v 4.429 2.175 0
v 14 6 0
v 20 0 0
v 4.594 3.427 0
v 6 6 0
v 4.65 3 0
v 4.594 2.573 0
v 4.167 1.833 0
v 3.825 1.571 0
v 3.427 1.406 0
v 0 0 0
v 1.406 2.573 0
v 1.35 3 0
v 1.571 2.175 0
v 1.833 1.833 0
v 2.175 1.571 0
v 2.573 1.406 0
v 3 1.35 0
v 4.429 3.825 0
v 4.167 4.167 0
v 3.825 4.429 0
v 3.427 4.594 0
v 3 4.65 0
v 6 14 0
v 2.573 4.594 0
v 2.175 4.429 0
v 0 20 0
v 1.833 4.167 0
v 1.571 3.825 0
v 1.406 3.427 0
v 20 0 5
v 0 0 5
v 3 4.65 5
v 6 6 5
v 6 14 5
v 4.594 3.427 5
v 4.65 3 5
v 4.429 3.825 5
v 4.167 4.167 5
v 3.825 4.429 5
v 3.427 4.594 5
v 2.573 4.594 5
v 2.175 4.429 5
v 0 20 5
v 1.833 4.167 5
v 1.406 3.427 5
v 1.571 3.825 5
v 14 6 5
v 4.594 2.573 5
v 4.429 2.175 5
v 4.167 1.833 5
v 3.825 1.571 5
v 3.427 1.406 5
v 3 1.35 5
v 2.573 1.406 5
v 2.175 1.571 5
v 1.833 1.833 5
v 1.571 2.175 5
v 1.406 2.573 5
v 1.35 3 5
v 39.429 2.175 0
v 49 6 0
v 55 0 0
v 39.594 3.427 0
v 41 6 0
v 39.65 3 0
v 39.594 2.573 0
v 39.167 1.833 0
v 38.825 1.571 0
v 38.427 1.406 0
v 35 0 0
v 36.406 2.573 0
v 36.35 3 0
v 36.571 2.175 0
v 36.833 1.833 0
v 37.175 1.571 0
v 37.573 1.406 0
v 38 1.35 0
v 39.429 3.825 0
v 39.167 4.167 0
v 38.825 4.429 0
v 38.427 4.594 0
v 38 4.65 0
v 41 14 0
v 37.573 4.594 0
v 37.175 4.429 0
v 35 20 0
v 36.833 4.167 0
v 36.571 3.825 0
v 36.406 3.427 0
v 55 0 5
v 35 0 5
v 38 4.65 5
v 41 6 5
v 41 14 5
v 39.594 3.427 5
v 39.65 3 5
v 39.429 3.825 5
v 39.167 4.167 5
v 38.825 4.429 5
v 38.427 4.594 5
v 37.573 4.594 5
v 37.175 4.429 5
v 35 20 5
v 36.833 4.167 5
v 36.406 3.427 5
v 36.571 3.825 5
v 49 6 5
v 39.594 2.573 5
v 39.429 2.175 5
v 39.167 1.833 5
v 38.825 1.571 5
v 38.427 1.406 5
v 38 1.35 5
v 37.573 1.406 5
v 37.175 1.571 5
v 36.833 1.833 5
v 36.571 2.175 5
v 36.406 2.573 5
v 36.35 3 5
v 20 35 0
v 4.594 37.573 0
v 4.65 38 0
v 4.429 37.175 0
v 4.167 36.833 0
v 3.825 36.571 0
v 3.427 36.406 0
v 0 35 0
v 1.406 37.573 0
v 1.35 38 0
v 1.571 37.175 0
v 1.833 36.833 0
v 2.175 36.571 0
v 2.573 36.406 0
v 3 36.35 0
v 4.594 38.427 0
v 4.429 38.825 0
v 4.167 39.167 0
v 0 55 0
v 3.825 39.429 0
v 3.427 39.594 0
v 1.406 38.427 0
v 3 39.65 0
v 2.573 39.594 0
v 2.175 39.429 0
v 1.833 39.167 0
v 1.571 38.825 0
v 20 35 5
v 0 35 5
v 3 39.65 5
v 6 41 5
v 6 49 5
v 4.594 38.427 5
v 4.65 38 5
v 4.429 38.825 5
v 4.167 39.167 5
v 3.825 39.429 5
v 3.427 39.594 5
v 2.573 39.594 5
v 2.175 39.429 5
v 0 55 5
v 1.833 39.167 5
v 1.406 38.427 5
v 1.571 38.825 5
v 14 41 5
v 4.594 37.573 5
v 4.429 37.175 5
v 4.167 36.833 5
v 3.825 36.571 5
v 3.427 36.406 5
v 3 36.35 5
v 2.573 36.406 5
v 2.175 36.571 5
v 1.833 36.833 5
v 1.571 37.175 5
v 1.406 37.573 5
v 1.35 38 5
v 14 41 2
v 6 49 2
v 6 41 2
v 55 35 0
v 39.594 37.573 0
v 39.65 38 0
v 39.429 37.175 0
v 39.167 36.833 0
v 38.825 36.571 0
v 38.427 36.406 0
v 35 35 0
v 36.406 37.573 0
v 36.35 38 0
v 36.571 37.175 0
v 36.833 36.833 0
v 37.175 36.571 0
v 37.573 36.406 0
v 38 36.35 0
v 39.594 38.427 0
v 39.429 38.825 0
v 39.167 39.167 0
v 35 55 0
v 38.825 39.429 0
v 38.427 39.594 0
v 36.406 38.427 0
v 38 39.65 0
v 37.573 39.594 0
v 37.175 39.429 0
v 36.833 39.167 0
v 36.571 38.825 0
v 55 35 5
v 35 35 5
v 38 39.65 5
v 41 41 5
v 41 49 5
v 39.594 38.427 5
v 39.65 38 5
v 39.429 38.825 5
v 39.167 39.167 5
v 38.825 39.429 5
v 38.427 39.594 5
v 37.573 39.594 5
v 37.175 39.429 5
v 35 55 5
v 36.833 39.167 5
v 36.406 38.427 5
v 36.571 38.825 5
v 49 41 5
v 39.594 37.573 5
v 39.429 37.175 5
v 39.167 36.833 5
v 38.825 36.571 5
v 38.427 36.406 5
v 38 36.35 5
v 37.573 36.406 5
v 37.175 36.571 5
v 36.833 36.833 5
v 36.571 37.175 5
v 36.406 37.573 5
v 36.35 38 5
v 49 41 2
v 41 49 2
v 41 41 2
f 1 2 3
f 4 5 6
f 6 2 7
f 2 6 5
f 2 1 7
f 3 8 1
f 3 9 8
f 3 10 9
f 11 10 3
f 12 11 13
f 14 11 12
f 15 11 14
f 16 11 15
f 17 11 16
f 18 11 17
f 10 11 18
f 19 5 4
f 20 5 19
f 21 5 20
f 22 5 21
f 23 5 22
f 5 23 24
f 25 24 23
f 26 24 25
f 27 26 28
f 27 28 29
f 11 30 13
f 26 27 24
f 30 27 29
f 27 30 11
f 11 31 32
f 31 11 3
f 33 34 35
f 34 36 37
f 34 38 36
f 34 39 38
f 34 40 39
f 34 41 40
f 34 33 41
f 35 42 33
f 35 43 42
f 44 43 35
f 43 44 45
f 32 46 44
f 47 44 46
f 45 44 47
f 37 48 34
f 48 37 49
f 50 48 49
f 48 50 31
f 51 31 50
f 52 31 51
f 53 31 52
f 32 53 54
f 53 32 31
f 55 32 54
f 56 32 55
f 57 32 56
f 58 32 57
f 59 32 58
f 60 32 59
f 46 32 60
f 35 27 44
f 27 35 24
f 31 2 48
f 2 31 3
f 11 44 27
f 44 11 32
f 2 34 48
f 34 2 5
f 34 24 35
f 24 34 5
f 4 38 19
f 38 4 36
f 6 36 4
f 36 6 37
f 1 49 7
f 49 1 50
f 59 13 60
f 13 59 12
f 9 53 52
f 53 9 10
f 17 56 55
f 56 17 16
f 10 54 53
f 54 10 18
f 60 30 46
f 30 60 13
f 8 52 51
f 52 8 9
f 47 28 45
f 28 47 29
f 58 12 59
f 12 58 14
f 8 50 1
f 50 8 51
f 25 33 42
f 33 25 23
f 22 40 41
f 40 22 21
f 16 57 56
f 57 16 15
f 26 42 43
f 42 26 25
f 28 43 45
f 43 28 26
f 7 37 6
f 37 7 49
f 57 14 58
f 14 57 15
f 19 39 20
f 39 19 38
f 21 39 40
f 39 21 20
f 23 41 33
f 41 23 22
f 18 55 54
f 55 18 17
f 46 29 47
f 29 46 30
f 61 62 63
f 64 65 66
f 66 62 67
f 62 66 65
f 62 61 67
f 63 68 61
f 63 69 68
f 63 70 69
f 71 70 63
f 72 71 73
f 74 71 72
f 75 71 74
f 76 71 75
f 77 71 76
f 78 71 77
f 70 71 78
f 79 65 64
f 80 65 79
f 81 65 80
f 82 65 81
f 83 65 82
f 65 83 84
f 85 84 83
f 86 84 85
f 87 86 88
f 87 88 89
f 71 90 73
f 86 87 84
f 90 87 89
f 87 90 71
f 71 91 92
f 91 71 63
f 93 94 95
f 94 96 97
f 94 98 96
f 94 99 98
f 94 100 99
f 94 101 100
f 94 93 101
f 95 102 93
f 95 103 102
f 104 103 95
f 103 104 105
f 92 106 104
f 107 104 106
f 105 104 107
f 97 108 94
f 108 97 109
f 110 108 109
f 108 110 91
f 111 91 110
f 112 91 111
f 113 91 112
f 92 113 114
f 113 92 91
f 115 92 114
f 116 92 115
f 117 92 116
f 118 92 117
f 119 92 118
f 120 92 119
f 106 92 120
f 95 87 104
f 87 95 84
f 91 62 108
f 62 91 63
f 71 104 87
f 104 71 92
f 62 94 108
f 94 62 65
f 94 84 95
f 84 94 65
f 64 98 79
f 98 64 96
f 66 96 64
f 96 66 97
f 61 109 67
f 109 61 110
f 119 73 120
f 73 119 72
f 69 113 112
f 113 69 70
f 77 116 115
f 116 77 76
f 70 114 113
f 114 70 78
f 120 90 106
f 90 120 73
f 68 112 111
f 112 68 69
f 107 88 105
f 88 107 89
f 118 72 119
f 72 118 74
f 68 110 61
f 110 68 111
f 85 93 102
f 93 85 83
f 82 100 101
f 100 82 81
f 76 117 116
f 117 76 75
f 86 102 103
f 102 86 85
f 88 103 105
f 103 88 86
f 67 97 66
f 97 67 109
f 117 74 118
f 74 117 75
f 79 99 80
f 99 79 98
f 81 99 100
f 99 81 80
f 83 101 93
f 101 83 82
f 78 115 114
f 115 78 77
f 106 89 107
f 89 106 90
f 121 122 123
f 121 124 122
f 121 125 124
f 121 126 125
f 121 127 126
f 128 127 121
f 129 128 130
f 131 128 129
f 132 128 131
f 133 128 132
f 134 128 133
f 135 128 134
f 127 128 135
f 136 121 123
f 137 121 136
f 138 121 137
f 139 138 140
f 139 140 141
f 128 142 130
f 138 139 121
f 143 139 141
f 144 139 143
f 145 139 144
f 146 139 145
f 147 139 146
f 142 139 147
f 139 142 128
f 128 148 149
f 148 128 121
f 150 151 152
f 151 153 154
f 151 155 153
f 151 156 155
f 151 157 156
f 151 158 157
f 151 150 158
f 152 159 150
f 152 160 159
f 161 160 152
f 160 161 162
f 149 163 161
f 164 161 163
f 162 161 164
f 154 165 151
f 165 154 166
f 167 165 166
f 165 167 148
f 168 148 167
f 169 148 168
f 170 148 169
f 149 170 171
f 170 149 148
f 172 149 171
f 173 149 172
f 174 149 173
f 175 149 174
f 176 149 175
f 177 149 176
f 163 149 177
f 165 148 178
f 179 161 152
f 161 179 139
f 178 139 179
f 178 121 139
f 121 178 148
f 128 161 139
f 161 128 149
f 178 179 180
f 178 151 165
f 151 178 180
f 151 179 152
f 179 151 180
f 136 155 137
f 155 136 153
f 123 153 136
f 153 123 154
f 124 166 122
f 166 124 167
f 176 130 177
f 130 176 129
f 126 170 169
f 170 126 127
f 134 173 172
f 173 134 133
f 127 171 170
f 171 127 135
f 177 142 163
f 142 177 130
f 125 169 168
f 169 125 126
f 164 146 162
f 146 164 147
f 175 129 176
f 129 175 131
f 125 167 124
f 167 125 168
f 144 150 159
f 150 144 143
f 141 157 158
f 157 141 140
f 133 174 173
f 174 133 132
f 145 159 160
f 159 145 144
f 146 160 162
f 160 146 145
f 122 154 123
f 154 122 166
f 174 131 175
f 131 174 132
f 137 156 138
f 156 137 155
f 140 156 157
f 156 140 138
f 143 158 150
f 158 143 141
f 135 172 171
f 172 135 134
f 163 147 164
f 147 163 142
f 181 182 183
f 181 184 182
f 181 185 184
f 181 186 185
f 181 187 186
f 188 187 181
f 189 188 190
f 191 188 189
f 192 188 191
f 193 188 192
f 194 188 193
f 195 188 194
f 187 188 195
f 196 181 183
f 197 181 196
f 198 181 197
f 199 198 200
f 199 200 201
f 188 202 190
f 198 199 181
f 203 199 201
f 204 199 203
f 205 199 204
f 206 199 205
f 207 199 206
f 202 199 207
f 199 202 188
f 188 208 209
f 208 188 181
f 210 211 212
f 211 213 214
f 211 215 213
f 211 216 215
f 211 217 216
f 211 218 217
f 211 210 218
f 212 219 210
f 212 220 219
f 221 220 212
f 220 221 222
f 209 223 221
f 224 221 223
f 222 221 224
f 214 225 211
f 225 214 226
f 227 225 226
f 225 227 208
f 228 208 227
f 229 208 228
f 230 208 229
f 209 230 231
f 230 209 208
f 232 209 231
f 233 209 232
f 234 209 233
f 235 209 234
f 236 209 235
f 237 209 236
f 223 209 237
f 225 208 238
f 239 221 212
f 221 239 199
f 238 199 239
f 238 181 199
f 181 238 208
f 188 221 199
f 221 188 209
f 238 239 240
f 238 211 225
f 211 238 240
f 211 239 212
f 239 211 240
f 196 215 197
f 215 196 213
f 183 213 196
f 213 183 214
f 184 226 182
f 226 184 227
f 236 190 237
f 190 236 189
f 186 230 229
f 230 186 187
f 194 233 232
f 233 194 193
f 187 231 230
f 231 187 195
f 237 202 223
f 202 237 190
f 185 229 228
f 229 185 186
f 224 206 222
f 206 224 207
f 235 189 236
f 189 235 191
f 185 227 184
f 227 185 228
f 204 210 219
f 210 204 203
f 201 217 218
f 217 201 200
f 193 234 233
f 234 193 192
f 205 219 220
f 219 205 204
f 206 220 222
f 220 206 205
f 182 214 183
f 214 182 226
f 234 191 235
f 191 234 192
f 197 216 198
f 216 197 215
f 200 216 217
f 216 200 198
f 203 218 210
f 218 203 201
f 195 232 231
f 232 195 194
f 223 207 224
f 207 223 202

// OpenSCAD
/*
	Glass plate holder
	By Humberto Kelkboom
	Lark3D.nl
	
	Changed: Inserted adjustable side thikness.
*/

//The width of the triange
WidthOffTriagle=25;
//The width of the Sides
WithOffSides = 6;

module triangle(width,length,h)
{
	linear_extrude(height=h) 
	polygon([[0,0],[0,width],[length,0]]);
}

module PlateHolder(OOC){
difference(){
triangle(20,20,5);
translate([WithOffSides,WithOffSides,(OOC=="open"?-0.5:2)])triangle(10,10,6);
translate([3,3,2.5])cylinder(r=1.65, h=6, center=true,$fn=24);
}
};

PlateHolder("open");
translate([WidthOffTriagle +10,0,0])PlateHolder("open");
translate([0,WidthOffTriagle +10,0])PlateHolder("close");
translate([WidthOffTriagle +10,WidthOffTriagle +10,0])PlateHolder("close");
